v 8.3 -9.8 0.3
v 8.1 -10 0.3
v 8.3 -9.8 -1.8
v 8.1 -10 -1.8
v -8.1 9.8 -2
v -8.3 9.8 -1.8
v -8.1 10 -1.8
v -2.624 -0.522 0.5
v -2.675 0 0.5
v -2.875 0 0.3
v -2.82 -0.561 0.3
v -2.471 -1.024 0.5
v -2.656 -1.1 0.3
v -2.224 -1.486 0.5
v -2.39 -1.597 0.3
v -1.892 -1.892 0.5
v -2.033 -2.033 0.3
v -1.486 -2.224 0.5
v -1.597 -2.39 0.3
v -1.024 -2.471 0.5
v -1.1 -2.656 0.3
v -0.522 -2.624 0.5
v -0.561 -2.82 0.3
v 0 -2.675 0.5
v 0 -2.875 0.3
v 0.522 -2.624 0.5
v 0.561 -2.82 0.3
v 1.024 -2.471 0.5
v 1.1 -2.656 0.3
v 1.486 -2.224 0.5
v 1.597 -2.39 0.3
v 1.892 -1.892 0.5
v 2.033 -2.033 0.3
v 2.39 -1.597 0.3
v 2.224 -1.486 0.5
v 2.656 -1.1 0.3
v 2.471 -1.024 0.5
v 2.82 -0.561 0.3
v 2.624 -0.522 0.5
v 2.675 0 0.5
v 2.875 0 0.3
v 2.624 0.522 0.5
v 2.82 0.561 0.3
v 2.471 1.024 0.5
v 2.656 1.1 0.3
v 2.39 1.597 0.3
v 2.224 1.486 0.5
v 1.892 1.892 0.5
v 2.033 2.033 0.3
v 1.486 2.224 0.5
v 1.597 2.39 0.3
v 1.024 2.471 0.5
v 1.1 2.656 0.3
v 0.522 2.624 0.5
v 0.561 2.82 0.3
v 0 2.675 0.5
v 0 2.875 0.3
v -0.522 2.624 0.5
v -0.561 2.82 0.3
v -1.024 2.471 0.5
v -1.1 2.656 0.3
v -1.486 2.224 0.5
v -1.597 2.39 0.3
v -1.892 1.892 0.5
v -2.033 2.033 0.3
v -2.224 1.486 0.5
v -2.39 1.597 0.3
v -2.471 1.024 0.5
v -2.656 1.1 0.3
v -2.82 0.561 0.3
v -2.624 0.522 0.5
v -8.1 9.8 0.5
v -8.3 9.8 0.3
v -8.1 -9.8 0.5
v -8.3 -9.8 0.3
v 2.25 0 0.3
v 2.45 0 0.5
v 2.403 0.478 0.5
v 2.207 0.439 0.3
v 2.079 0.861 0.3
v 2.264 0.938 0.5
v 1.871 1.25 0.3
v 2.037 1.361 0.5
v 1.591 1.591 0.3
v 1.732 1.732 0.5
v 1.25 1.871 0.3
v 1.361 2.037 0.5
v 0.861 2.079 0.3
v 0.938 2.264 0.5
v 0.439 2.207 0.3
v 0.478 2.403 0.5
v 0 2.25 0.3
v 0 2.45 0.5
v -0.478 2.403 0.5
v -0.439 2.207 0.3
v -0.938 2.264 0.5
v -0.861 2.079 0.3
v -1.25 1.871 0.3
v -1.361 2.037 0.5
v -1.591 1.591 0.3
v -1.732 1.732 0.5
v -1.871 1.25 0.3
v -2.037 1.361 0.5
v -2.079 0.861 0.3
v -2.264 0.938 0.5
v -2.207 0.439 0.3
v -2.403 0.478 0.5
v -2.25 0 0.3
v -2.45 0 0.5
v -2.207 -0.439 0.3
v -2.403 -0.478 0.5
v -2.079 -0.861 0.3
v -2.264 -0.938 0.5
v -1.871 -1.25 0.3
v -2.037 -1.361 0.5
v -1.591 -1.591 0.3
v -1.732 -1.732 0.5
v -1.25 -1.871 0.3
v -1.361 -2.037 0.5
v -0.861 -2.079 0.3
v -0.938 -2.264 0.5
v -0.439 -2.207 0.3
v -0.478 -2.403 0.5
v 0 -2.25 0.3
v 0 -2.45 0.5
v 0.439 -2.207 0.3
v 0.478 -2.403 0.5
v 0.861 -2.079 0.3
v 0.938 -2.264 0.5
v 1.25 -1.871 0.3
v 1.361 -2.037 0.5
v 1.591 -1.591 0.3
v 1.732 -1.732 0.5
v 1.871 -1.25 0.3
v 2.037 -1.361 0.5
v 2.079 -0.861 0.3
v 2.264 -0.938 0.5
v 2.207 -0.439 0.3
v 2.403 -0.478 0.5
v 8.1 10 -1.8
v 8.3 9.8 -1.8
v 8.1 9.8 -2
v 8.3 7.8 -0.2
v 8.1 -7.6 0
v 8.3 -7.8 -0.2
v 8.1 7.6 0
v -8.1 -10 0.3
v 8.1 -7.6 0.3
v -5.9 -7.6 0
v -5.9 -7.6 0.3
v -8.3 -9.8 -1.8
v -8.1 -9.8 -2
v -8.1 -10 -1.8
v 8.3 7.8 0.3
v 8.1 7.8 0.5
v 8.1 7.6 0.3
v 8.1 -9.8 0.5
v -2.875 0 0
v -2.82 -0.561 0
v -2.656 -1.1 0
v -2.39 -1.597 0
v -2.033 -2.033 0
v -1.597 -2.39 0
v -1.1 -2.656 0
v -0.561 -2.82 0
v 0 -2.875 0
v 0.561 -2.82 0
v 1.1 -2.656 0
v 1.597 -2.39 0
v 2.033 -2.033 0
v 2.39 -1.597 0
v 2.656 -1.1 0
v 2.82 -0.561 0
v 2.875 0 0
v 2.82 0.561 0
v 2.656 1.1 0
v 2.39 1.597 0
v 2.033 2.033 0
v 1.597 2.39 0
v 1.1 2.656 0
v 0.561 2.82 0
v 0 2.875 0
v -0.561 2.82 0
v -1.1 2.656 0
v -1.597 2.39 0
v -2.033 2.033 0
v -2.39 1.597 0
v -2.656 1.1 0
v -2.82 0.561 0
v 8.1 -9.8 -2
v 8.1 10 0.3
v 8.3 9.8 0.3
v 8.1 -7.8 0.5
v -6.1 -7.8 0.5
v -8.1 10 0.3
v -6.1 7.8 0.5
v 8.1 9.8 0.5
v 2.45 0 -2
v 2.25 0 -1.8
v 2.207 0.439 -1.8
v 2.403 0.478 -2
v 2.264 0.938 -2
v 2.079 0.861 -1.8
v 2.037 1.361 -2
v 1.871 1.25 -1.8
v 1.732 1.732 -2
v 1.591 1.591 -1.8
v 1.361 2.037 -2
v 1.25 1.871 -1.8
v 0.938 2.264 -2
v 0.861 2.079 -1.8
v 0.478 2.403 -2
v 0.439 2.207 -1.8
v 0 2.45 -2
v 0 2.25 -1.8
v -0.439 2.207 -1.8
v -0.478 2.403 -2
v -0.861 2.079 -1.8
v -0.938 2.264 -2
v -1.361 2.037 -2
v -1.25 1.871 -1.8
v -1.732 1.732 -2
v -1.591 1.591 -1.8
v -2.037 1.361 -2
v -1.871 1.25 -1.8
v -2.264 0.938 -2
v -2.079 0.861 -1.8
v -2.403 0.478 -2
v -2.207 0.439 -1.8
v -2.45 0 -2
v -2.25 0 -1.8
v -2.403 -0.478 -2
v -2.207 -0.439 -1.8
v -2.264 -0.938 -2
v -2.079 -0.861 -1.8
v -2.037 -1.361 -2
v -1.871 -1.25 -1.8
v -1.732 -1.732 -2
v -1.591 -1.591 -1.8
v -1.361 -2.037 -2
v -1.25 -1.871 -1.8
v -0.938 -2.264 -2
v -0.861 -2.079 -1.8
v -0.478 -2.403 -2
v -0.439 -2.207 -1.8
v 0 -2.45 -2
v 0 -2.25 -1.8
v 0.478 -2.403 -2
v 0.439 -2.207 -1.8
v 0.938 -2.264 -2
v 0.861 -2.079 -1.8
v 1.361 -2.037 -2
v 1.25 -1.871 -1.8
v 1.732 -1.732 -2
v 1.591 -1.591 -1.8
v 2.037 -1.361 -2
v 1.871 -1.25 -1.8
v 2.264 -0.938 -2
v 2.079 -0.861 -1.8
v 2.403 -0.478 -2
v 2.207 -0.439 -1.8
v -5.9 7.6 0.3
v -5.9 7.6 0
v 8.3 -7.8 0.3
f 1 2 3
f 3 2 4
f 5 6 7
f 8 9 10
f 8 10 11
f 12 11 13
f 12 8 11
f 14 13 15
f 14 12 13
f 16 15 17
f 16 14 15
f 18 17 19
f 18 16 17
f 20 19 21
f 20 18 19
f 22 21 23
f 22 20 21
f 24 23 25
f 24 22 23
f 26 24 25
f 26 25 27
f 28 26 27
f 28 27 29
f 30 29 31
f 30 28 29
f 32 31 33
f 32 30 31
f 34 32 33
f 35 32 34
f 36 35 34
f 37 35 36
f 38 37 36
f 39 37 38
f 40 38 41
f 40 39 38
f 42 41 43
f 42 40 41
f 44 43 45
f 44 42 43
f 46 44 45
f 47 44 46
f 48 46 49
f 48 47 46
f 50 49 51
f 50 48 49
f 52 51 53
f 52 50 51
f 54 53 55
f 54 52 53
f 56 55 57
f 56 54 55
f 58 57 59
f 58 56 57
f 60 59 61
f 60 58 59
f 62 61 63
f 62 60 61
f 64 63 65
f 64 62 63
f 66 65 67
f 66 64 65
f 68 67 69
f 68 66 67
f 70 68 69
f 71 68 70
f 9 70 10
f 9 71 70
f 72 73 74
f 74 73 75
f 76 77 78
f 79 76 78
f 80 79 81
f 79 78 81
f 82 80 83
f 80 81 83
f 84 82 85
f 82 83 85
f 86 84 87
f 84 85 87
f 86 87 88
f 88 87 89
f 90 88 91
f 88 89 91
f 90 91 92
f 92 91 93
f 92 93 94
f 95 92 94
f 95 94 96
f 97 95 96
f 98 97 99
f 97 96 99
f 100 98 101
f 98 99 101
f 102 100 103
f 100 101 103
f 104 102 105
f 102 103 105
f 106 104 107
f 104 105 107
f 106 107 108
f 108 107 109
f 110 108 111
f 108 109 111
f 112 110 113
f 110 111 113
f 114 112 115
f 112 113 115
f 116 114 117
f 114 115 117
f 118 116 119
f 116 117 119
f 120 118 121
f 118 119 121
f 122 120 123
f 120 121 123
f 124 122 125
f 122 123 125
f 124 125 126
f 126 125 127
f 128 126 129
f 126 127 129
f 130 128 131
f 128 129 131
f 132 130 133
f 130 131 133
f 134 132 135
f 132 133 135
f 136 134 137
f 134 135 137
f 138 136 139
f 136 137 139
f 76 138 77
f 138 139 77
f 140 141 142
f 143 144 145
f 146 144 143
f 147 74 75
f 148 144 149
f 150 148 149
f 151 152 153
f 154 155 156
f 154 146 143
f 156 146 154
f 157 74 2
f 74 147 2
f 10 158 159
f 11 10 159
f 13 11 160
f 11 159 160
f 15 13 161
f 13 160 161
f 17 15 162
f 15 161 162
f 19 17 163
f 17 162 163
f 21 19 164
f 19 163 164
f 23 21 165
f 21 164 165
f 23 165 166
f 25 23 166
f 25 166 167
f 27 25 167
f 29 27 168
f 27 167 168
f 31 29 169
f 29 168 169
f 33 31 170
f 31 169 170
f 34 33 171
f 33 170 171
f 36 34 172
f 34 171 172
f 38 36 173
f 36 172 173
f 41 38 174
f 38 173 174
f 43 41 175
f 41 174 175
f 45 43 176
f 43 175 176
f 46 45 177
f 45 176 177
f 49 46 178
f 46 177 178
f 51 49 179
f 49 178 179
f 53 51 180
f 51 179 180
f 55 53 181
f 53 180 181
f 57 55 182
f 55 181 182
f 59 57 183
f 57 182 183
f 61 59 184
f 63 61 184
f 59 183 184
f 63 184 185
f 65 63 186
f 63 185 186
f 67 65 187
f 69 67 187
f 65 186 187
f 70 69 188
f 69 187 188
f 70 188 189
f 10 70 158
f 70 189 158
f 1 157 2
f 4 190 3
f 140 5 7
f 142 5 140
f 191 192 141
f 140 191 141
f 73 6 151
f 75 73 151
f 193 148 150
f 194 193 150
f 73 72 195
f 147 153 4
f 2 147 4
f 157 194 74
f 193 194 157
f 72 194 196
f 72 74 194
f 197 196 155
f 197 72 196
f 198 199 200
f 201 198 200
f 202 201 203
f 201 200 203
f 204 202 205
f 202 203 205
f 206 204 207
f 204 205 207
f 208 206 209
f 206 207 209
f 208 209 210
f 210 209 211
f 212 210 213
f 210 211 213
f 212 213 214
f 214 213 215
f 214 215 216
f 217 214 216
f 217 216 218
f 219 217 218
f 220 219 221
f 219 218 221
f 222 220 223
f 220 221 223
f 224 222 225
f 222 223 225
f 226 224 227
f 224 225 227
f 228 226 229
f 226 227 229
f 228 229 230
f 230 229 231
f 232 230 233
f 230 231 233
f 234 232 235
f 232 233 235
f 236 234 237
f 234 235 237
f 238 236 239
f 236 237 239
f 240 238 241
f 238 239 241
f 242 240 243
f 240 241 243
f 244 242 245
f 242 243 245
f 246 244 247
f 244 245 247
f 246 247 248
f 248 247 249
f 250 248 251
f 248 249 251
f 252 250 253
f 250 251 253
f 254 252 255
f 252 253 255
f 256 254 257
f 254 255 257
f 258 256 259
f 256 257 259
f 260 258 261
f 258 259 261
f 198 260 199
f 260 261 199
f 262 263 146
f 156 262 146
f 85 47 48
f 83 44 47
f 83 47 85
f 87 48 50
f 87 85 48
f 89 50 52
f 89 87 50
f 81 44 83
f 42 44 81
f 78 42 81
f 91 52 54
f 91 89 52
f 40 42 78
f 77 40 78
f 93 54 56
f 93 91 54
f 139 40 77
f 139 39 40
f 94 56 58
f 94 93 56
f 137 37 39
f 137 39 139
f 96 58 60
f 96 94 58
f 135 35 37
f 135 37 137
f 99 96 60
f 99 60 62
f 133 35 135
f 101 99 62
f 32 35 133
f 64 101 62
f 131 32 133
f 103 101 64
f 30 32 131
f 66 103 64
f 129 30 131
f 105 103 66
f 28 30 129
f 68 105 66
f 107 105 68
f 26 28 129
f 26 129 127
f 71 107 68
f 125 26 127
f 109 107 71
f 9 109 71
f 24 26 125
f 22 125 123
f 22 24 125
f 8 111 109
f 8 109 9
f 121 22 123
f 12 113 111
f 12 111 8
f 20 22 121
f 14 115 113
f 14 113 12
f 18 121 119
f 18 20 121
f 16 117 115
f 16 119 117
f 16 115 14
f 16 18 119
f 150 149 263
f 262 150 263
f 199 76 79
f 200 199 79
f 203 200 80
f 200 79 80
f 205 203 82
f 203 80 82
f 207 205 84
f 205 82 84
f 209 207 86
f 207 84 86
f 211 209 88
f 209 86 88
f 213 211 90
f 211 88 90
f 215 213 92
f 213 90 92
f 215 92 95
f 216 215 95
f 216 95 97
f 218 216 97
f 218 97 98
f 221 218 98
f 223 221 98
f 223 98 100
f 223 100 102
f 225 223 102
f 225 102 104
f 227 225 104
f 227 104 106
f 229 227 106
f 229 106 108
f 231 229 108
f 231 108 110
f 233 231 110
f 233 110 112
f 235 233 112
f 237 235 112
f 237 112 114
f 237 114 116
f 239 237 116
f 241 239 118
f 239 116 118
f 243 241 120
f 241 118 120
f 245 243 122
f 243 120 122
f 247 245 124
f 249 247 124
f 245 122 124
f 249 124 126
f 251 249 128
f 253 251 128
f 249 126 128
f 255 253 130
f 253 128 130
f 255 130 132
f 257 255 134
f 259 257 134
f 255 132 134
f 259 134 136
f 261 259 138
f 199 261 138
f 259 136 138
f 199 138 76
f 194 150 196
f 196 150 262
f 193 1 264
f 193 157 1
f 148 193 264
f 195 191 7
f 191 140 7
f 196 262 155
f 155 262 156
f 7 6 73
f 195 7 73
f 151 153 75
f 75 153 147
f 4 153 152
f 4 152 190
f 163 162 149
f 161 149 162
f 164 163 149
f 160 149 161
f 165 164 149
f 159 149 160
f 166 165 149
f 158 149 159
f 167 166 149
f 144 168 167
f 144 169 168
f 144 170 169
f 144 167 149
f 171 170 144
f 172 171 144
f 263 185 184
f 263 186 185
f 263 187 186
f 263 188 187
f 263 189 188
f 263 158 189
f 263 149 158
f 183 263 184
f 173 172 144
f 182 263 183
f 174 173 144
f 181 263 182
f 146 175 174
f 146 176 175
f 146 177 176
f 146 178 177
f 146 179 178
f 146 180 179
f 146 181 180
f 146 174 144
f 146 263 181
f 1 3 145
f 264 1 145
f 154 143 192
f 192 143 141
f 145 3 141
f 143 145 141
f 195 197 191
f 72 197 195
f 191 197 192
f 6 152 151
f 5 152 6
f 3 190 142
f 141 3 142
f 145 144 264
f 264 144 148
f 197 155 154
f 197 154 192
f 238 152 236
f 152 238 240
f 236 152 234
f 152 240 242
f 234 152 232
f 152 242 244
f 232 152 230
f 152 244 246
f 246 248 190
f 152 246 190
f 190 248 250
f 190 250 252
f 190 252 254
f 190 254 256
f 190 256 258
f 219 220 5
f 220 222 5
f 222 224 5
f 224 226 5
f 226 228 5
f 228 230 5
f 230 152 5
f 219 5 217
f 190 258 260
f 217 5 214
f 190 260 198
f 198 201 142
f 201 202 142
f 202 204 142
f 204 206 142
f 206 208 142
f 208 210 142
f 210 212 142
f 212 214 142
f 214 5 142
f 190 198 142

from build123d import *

# Parameters (mm, degrees)
SKETCH1_W            = 16.6
SKETCH1_H            = 20
BOSS_EXTRUDE1_DEPTH  = 2
EXTRUDE_THIN1_DEPTH  = 0.5
SKETCH3_R            = 2.875
BOSS_EXTRUDE2_DEPTH  = 0.5
M4_CLEARANCE_HOLE1_D = 4.5
DEBURS_SIZE          = 0.2


with BuildPart() as part:
    # Sketch1 → Boss-Extrude1 (new body)
    with BuildSketch(Plane.XY):
        Rectangle(SKETCH1_W, SKETCH1_H)
    extrude(amount=-BOSS_EXTRUDE1_DEPTH)

    # Sketch2 → Extrude-Thin1 (add)
    with BuildSketch(Plane.XY):
        Polygon((8.3, 10), (-8.3, 10), (-8.3, -10), (8.3, -10), (8.3, -7.6), (-5.9, -7.6), (-5.9, 7.6), (8.3, 7.6), align=None)
    extrude(amount=EXTRUDE_THIN1_DEPTH)

    # Sketch3 → Boss-Extrude2 (add)
    with BuildSketch(Plane.XY):
        with Locations(Location((0, 0, 0), (0, 0, 180))):
            Circle(SKETCH3_R)
    extrude(amount=BOSS_EXTRUDE2_DEPTH)

    # M4 Clearance Hole1 (through all)
    with Locations(Plane(origin=(0, 0, -2), x_dir=(-1, 0, 0), z_dir=(0, 0, -1))):
        with Locations((0, 0)):
            Hole(M4_CLEARANCE_HOLE1_D / 2)

    # Deburs
    deburs_edges = [part.edges().sort_by_distance(p)[0] for p in [
        (-8.3, 0, -2),
        (8.3, 0, 0),
        (8.3, -8.8, 0.5),
        (1.2, -7.6, 0.5),
        (0, -10, -2),
        (8.3, -7.6, 0.25),
        (-5.9, 0, 0.5),
        (1.2, 7.6, 0.5),
        (8.3, 8.8, 0.5),
        (8.3, 7.6, 0.25),
        (0, -10, 0.5),
        (0, 10, 0.5),
        (-8.3, 0, 0.5),
        (2.875, 0, 0.5),
        (-2.25, 0, -2),
        (-2.25, 0, 0.5),
        (8.3, 0, -2),
        (8.3, -10, -0.75),
        (-8.3, -10, -0.75),
        (-8.3, 10, -0.75),
        (8.3, 10, -0.75),
        (0, 10, -2),
    ]]
    chamfer(deburs_edges, length=DEBURS_SIZE)


solid = part.part
